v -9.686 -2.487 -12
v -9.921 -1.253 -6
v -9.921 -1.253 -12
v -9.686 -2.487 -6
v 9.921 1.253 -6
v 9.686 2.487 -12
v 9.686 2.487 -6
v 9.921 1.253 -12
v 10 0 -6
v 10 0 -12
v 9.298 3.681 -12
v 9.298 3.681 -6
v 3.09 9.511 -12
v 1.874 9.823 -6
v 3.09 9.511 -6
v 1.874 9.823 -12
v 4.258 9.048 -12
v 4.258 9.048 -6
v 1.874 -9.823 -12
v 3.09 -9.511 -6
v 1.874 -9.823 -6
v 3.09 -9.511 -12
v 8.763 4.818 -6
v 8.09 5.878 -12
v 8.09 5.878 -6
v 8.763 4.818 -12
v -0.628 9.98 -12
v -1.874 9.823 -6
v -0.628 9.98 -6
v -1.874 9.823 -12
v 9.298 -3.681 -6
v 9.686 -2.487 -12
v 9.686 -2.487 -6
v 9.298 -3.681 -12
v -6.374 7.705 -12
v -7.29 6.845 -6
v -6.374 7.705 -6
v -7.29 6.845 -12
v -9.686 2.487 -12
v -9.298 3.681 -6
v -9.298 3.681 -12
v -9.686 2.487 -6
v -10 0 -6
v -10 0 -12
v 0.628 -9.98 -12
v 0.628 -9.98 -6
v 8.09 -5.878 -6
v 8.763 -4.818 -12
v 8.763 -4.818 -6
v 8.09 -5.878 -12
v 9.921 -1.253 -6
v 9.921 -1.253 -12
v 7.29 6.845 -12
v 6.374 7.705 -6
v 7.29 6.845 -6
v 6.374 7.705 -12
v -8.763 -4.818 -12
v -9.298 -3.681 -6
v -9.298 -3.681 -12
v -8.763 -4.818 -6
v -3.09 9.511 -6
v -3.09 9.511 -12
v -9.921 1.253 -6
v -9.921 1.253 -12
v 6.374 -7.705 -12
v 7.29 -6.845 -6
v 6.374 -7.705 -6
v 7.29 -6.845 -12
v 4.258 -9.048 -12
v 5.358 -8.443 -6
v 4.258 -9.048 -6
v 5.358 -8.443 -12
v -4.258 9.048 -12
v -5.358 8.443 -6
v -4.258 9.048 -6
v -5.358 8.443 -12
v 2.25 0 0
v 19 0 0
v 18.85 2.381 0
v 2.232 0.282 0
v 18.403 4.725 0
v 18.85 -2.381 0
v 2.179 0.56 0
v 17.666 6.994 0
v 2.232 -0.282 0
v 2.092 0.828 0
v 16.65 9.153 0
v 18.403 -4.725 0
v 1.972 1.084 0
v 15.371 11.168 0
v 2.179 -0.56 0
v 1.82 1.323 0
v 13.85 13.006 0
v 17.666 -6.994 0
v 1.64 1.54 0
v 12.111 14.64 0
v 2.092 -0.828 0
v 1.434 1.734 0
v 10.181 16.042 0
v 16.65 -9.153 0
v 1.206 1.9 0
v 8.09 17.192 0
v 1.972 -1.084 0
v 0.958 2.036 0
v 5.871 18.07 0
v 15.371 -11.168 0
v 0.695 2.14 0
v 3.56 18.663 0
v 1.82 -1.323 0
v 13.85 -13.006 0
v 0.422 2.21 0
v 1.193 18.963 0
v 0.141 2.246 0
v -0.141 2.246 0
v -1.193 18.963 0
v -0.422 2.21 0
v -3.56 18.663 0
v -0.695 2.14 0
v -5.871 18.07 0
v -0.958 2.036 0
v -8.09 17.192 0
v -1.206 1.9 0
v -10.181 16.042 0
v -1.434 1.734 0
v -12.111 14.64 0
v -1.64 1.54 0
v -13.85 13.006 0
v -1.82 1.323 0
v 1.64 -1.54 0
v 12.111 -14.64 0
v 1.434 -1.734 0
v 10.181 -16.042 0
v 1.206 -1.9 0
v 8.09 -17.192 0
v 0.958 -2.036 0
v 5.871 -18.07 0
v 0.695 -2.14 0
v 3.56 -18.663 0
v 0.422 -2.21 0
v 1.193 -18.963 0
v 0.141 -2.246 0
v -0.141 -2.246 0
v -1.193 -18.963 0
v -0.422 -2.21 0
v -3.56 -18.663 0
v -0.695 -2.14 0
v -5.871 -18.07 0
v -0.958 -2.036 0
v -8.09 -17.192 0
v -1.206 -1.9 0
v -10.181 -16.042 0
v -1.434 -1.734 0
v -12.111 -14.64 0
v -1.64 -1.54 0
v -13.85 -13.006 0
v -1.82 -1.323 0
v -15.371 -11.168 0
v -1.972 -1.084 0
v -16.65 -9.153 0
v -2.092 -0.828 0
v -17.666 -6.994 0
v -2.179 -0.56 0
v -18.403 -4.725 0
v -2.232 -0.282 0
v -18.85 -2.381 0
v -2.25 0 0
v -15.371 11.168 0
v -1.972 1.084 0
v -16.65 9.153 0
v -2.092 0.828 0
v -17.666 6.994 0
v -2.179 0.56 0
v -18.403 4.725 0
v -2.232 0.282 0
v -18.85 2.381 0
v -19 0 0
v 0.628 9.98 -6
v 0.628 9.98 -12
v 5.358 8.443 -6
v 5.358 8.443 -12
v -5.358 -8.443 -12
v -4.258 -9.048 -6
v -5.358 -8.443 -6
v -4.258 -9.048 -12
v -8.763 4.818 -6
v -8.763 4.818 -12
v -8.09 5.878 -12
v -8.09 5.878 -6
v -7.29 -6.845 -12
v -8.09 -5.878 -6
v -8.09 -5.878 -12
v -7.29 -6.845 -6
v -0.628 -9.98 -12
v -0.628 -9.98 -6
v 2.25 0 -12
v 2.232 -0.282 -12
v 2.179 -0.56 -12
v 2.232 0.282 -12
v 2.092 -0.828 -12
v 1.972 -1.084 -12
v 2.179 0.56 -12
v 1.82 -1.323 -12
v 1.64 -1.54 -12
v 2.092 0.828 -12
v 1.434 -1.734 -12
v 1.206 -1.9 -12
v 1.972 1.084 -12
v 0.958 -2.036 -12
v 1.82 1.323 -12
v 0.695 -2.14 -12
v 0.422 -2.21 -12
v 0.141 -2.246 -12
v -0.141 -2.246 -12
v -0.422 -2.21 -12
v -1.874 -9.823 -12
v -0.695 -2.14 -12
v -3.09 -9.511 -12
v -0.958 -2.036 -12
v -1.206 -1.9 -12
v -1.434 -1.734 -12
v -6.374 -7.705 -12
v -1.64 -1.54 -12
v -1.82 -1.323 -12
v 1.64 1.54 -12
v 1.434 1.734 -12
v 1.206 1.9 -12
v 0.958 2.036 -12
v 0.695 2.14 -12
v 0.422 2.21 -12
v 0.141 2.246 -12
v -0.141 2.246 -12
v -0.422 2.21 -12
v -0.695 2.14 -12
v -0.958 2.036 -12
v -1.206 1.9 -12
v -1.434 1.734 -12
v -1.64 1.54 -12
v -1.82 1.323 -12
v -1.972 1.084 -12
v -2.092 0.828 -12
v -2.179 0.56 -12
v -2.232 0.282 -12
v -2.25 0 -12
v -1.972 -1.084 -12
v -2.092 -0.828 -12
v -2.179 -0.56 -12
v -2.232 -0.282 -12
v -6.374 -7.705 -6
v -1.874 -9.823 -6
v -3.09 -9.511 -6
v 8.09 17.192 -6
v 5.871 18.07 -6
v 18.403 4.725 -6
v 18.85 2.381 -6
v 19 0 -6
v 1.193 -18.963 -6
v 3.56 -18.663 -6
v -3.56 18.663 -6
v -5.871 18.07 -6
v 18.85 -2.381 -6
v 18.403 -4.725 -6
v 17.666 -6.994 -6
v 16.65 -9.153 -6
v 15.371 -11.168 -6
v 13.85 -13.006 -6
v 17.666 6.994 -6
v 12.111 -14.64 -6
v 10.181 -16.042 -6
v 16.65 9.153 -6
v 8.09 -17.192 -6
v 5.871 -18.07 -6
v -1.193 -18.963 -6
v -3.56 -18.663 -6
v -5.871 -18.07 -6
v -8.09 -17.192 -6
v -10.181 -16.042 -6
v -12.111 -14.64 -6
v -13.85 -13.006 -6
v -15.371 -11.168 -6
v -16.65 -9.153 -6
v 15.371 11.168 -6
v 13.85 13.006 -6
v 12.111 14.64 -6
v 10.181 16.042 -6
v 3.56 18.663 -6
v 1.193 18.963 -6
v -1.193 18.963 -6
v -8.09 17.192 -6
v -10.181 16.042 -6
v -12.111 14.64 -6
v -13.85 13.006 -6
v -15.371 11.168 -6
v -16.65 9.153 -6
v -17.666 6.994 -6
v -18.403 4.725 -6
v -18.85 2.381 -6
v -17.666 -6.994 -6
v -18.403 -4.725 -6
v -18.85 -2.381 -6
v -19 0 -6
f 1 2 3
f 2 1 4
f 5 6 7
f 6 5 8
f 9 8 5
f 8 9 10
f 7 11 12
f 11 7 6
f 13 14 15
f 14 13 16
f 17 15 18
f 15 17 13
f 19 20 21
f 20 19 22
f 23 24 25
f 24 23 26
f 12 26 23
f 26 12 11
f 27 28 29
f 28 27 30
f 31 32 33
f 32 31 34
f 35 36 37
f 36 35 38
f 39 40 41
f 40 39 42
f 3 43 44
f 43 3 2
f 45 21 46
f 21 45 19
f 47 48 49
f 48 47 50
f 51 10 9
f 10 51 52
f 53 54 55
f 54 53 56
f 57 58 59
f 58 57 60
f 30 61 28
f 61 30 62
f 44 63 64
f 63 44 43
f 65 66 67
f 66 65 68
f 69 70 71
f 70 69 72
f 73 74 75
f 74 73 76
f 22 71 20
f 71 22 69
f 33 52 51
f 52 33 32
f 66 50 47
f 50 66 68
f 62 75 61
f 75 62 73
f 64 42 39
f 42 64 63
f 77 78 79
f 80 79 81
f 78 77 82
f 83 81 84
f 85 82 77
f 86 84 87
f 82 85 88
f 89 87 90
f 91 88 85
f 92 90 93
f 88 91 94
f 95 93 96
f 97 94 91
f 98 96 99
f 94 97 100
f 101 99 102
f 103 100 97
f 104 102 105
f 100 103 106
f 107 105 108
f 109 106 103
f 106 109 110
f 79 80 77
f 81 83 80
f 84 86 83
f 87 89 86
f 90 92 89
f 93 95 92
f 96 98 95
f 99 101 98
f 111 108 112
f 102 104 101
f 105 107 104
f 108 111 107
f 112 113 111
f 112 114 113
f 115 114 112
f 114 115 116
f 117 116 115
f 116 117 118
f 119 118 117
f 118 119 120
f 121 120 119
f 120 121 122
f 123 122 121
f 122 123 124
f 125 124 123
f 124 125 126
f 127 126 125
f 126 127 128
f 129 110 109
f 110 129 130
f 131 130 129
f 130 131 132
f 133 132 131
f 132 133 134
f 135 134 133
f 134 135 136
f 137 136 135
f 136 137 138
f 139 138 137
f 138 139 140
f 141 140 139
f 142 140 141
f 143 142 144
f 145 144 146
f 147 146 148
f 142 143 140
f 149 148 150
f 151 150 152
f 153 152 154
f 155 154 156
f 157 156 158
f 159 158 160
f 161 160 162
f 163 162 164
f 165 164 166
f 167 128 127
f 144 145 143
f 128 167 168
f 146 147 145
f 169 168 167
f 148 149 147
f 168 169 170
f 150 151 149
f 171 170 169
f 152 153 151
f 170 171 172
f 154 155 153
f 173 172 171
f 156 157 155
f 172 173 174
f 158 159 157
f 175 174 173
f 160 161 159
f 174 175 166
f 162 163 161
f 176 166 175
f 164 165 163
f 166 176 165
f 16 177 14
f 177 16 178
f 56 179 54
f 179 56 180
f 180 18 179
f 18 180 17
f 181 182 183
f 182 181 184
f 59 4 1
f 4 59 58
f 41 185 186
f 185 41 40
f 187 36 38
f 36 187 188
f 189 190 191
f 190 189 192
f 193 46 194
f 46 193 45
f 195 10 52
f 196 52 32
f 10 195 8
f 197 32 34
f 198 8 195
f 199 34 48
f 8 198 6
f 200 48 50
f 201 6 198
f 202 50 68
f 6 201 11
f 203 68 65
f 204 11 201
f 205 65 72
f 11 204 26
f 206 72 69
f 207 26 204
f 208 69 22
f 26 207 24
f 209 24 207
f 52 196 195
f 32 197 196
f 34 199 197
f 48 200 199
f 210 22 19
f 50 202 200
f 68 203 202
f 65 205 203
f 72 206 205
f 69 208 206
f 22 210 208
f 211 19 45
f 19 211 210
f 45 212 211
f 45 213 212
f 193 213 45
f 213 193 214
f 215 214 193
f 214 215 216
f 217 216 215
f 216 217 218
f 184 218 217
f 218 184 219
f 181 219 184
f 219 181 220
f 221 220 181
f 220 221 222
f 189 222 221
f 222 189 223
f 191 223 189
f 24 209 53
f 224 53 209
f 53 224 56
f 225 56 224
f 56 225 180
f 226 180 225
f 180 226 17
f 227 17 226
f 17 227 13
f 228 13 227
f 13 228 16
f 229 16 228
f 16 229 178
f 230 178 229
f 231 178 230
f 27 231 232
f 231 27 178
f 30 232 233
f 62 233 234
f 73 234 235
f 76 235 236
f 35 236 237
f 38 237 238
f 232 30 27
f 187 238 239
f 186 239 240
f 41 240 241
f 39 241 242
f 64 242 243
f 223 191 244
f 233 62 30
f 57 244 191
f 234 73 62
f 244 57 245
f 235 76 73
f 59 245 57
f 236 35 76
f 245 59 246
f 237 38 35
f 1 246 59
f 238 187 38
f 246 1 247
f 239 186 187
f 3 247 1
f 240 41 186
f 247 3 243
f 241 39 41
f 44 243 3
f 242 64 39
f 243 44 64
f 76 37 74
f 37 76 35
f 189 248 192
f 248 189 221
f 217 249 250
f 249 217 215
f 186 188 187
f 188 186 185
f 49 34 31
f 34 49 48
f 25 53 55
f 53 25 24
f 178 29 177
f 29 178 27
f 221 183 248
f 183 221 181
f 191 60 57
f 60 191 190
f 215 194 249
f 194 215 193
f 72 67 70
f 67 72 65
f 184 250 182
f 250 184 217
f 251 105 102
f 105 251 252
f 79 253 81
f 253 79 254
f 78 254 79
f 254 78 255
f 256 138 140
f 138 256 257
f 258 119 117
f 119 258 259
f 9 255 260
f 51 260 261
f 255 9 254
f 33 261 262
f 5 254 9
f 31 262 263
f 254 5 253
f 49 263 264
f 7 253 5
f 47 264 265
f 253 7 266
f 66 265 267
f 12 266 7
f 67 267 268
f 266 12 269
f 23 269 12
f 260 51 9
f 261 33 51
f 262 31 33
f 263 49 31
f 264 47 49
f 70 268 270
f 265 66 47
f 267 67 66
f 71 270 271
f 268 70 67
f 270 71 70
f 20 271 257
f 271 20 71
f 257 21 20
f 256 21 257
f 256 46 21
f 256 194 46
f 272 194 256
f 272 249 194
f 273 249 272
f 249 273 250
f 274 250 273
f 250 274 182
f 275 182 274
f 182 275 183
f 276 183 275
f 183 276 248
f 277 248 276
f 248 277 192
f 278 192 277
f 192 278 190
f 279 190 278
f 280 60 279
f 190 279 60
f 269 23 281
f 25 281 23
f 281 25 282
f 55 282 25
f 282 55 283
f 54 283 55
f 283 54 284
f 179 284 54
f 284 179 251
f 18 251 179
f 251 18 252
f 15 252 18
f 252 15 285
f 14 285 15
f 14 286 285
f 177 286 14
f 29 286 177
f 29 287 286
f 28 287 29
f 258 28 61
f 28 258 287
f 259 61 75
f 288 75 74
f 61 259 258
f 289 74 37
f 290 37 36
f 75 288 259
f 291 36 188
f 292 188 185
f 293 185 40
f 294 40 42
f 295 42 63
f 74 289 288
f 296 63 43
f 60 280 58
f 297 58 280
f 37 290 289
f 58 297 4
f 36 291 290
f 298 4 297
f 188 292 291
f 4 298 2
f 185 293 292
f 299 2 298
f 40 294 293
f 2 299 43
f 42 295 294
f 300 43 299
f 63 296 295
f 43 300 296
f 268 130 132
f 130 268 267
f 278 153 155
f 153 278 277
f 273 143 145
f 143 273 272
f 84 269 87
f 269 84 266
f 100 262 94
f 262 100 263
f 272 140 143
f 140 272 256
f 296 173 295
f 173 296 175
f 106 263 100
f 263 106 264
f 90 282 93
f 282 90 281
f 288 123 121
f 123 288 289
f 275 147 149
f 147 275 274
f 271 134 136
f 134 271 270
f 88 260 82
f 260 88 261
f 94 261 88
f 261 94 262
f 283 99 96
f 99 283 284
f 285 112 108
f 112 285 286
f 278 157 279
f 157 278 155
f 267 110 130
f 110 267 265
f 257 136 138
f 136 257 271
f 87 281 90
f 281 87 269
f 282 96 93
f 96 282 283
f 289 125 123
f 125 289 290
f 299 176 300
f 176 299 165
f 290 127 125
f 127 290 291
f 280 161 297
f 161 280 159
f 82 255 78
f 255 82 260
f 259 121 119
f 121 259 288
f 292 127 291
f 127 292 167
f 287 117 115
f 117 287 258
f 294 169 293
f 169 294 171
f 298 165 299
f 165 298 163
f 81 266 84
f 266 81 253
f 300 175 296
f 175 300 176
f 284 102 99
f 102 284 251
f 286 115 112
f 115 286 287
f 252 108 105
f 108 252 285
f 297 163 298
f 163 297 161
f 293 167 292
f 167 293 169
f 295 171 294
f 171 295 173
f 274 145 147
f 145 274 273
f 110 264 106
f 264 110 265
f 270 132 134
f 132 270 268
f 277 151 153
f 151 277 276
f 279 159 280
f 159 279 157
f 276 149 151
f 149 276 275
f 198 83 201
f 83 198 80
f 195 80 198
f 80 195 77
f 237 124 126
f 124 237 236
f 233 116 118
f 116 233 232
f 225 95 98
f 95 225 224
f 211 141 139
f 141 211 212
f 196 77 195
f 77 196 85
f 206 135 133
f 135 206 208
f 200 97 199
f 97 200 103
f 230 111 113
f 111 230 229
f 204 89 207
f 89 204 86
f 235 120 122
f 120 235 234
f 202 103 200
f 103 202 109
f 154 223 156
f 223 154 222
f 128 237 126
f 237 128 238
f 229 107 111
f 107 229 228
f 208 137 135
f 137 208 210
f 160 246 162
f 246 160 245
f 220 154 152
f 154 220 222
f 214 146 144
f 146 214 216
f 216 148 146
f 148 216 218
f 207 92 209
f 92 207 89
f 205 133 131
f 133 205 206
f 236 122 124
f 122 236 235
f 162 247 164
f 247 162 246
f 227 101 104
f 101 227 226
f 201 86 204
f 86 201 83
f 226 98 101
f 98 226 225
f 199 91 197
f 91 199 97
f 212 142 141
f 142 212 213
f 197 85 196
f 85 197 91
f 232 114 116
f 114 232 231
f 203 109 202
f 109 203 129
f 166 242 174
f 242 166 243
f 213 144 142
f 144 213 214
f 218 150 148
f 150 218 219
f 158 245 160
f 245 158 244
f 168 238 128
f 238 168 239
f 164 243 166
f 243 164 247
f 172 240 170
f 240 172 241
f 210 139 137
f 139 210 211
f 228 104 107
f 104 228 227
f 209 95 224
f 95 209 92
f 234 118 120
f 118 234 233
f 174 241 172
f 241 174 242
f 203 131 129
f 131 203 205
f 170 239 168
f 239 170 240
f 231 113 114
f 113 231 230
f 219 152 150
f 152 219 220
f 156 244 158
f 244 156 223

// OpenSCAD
$fn = 50;


difference() {
	union() {
		translate(v = [0, 0, -12.0000000000]) {
			cylinder(h = 12, r = 10.0000000000);
		}
		translate(v = [0, 0, -6.0000000000]) {
			cylinder(h = 6, r = 19.0000000000);
		}
	}
	union() {
		#translate(v = [0, 0, -12]) {
			cylinder(h = 12, r = 2.2500000000);
		}
	}
}
